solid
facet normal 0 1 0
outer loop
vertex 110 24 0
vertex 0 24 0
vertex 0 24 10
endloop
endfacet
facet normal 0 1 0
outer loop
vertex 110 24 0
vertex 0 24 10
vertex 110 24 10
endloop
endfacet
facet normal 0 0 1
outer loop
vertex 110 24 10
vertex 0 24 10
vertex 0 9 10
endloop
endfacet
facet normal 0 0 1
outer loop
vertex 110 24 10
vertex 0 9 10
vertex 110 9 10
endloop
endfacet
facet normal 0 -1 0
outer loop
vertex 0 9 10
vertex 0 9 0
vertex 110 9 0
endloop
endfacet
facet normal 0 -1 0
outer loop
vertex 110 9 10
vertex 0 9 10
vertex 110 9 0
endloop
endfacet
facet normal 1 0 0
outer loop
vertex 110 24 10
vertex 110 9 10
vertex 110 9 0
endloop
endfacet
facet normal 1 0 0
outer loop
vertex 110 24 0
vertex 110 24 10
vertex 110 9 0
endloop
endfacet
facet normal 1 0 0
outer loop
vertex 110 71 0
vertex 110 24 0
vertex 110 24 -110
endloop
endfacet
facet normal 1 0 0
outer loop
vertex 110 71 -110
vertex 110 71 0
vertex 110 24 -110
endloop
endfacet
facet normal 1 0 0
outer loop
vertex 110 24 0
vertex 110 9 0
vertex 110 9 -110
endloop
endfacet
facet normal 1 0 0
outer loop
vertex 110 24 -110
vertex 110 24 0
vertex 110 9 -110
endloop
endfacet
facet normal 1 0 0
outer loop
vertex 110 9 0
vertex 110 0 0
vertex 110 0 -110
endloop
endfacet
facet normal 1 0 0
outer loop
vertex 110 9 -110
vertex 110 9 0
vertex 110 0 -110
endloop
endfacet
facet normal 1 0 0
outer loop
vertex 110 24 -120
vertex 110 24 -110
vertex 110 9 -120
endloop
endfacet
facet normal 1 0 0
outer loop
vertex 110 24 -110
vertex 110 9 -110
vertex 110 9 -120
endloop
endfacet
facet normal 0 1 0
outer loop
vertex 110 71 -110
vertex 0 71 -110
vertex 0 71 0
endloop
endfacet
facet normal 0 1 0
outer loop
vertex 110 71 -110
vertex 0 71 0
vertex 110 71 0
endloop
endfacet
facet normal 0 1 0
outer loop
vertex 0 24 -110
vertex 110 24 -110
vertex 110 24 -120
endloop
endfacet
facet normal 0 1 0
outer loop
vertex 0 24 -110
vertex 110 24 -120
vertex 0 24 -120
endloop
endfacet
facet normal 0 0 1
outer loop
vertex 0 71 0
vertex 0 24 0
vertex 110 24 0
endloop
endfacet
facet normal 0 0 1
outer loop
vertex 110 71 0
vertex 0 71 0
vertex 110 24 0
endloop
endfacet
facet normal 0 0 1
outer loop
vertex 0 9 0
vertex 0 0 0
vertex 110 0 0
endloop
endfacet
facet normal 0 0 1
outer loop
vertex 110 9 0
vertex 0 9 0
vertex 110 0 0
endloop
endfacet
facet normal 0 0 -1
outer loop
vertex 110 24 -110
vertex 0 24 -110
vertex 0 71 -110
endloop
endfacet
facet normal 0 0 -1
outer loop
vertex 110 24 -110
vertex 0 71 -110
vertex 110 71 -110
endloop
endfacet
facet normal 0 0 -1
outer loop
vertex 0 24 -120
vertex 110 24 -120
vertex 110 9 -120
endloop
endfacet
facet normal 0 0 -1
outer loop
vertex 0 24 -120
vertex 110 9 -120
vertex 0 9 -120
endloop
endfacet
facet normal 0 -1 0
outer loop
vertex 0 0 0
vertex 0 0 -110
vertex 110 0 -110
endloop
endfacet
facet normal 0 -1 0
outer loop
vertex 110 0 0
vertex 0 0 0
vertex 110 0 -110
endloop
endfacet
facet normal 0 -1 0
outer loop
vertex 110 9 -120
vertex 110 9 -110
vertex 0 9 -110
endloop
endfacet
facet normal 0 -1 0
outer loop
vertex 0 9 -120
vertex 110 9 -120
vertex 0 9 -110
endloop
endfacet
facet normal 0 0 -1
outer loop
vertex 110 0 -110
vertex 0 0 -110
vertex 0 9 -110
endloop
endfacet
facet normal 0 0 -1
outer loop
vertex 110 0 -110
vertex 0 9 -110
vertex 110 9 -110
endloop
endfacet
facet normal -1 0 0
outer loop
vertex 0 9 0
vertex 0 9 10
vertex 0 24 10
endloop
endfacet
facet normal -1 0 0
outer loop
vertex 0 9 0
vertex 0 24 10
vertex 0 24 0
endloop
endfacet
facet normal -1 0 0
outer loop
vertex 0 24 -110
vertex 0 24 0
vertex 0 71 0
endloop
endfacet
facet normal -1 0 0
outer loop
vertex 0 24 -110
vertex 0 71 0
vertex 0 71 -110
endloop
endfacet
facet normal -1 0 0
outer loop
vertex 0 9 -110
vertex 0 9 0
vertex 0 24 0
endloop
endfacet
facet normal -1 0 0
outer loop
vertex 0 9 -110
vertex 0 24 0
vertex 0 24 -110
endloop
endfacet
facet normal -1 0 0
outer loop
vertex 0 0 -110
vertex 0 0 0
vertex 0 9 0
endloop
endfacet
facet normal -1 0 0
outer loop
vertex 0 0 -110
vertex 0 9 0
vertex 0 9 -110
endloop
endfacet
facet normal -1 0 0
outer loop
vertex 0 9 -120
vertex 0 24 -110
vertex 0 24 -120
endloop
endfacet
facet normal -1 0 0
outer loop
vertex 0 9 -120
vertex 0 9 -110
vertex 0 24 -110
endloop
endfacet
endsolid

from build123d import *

# Parameters (mm, degrees)
SKETCH_1_W      = 110
SKETCH_1_H      = 110
EXTRUDE_1_DEPTH = 71
SKETCH_2_W      = 110
SKETCH_2_H      = 15
EXTRUDE_3_DEPTH = 10
SKETCH_3_W      = 110
SKETCH_3_H      = 15
EXTRUDE_4_DEPTH = 10


with BuildPart() as part:
    # 草图1 → 凸台-拉伸1 (new body)
    with BuildSketch(Plane(origin=(0, 0, 0), x_dir=(1, 0, 0), z_dir=(0, 1, 0))):
        with Locations((55, 55)):
            Rectangle(SKETCH_1_W, SKETCH_1_H)
    extrude(amount=EXTRUDE_1_DEPTH)

    # 草图2 → 凸台-拉伸3 (add)
    with BuildSketch(Plane.XY):
        with Locations((55, 16.5)):
            Rectangle(SKETCH_2_W, SKETCH_2_H)
    extrude(amount=EXTRUDE_3_DEPTH)

    # 草图3 → 凸台-拉伸4 (add)
    with BuildSketch(Plane(origin=(0, 0, -110), x_dir=(-1, 0, 0), z_dir=(0, 0, -1))):
        with Locations((-55, 16.5)):
            Rectangle(SKETCH_3_W, SKETCH_3_H)
    extrude(amount=EXTRUDE_4_DEPTH)


solid = part.part
